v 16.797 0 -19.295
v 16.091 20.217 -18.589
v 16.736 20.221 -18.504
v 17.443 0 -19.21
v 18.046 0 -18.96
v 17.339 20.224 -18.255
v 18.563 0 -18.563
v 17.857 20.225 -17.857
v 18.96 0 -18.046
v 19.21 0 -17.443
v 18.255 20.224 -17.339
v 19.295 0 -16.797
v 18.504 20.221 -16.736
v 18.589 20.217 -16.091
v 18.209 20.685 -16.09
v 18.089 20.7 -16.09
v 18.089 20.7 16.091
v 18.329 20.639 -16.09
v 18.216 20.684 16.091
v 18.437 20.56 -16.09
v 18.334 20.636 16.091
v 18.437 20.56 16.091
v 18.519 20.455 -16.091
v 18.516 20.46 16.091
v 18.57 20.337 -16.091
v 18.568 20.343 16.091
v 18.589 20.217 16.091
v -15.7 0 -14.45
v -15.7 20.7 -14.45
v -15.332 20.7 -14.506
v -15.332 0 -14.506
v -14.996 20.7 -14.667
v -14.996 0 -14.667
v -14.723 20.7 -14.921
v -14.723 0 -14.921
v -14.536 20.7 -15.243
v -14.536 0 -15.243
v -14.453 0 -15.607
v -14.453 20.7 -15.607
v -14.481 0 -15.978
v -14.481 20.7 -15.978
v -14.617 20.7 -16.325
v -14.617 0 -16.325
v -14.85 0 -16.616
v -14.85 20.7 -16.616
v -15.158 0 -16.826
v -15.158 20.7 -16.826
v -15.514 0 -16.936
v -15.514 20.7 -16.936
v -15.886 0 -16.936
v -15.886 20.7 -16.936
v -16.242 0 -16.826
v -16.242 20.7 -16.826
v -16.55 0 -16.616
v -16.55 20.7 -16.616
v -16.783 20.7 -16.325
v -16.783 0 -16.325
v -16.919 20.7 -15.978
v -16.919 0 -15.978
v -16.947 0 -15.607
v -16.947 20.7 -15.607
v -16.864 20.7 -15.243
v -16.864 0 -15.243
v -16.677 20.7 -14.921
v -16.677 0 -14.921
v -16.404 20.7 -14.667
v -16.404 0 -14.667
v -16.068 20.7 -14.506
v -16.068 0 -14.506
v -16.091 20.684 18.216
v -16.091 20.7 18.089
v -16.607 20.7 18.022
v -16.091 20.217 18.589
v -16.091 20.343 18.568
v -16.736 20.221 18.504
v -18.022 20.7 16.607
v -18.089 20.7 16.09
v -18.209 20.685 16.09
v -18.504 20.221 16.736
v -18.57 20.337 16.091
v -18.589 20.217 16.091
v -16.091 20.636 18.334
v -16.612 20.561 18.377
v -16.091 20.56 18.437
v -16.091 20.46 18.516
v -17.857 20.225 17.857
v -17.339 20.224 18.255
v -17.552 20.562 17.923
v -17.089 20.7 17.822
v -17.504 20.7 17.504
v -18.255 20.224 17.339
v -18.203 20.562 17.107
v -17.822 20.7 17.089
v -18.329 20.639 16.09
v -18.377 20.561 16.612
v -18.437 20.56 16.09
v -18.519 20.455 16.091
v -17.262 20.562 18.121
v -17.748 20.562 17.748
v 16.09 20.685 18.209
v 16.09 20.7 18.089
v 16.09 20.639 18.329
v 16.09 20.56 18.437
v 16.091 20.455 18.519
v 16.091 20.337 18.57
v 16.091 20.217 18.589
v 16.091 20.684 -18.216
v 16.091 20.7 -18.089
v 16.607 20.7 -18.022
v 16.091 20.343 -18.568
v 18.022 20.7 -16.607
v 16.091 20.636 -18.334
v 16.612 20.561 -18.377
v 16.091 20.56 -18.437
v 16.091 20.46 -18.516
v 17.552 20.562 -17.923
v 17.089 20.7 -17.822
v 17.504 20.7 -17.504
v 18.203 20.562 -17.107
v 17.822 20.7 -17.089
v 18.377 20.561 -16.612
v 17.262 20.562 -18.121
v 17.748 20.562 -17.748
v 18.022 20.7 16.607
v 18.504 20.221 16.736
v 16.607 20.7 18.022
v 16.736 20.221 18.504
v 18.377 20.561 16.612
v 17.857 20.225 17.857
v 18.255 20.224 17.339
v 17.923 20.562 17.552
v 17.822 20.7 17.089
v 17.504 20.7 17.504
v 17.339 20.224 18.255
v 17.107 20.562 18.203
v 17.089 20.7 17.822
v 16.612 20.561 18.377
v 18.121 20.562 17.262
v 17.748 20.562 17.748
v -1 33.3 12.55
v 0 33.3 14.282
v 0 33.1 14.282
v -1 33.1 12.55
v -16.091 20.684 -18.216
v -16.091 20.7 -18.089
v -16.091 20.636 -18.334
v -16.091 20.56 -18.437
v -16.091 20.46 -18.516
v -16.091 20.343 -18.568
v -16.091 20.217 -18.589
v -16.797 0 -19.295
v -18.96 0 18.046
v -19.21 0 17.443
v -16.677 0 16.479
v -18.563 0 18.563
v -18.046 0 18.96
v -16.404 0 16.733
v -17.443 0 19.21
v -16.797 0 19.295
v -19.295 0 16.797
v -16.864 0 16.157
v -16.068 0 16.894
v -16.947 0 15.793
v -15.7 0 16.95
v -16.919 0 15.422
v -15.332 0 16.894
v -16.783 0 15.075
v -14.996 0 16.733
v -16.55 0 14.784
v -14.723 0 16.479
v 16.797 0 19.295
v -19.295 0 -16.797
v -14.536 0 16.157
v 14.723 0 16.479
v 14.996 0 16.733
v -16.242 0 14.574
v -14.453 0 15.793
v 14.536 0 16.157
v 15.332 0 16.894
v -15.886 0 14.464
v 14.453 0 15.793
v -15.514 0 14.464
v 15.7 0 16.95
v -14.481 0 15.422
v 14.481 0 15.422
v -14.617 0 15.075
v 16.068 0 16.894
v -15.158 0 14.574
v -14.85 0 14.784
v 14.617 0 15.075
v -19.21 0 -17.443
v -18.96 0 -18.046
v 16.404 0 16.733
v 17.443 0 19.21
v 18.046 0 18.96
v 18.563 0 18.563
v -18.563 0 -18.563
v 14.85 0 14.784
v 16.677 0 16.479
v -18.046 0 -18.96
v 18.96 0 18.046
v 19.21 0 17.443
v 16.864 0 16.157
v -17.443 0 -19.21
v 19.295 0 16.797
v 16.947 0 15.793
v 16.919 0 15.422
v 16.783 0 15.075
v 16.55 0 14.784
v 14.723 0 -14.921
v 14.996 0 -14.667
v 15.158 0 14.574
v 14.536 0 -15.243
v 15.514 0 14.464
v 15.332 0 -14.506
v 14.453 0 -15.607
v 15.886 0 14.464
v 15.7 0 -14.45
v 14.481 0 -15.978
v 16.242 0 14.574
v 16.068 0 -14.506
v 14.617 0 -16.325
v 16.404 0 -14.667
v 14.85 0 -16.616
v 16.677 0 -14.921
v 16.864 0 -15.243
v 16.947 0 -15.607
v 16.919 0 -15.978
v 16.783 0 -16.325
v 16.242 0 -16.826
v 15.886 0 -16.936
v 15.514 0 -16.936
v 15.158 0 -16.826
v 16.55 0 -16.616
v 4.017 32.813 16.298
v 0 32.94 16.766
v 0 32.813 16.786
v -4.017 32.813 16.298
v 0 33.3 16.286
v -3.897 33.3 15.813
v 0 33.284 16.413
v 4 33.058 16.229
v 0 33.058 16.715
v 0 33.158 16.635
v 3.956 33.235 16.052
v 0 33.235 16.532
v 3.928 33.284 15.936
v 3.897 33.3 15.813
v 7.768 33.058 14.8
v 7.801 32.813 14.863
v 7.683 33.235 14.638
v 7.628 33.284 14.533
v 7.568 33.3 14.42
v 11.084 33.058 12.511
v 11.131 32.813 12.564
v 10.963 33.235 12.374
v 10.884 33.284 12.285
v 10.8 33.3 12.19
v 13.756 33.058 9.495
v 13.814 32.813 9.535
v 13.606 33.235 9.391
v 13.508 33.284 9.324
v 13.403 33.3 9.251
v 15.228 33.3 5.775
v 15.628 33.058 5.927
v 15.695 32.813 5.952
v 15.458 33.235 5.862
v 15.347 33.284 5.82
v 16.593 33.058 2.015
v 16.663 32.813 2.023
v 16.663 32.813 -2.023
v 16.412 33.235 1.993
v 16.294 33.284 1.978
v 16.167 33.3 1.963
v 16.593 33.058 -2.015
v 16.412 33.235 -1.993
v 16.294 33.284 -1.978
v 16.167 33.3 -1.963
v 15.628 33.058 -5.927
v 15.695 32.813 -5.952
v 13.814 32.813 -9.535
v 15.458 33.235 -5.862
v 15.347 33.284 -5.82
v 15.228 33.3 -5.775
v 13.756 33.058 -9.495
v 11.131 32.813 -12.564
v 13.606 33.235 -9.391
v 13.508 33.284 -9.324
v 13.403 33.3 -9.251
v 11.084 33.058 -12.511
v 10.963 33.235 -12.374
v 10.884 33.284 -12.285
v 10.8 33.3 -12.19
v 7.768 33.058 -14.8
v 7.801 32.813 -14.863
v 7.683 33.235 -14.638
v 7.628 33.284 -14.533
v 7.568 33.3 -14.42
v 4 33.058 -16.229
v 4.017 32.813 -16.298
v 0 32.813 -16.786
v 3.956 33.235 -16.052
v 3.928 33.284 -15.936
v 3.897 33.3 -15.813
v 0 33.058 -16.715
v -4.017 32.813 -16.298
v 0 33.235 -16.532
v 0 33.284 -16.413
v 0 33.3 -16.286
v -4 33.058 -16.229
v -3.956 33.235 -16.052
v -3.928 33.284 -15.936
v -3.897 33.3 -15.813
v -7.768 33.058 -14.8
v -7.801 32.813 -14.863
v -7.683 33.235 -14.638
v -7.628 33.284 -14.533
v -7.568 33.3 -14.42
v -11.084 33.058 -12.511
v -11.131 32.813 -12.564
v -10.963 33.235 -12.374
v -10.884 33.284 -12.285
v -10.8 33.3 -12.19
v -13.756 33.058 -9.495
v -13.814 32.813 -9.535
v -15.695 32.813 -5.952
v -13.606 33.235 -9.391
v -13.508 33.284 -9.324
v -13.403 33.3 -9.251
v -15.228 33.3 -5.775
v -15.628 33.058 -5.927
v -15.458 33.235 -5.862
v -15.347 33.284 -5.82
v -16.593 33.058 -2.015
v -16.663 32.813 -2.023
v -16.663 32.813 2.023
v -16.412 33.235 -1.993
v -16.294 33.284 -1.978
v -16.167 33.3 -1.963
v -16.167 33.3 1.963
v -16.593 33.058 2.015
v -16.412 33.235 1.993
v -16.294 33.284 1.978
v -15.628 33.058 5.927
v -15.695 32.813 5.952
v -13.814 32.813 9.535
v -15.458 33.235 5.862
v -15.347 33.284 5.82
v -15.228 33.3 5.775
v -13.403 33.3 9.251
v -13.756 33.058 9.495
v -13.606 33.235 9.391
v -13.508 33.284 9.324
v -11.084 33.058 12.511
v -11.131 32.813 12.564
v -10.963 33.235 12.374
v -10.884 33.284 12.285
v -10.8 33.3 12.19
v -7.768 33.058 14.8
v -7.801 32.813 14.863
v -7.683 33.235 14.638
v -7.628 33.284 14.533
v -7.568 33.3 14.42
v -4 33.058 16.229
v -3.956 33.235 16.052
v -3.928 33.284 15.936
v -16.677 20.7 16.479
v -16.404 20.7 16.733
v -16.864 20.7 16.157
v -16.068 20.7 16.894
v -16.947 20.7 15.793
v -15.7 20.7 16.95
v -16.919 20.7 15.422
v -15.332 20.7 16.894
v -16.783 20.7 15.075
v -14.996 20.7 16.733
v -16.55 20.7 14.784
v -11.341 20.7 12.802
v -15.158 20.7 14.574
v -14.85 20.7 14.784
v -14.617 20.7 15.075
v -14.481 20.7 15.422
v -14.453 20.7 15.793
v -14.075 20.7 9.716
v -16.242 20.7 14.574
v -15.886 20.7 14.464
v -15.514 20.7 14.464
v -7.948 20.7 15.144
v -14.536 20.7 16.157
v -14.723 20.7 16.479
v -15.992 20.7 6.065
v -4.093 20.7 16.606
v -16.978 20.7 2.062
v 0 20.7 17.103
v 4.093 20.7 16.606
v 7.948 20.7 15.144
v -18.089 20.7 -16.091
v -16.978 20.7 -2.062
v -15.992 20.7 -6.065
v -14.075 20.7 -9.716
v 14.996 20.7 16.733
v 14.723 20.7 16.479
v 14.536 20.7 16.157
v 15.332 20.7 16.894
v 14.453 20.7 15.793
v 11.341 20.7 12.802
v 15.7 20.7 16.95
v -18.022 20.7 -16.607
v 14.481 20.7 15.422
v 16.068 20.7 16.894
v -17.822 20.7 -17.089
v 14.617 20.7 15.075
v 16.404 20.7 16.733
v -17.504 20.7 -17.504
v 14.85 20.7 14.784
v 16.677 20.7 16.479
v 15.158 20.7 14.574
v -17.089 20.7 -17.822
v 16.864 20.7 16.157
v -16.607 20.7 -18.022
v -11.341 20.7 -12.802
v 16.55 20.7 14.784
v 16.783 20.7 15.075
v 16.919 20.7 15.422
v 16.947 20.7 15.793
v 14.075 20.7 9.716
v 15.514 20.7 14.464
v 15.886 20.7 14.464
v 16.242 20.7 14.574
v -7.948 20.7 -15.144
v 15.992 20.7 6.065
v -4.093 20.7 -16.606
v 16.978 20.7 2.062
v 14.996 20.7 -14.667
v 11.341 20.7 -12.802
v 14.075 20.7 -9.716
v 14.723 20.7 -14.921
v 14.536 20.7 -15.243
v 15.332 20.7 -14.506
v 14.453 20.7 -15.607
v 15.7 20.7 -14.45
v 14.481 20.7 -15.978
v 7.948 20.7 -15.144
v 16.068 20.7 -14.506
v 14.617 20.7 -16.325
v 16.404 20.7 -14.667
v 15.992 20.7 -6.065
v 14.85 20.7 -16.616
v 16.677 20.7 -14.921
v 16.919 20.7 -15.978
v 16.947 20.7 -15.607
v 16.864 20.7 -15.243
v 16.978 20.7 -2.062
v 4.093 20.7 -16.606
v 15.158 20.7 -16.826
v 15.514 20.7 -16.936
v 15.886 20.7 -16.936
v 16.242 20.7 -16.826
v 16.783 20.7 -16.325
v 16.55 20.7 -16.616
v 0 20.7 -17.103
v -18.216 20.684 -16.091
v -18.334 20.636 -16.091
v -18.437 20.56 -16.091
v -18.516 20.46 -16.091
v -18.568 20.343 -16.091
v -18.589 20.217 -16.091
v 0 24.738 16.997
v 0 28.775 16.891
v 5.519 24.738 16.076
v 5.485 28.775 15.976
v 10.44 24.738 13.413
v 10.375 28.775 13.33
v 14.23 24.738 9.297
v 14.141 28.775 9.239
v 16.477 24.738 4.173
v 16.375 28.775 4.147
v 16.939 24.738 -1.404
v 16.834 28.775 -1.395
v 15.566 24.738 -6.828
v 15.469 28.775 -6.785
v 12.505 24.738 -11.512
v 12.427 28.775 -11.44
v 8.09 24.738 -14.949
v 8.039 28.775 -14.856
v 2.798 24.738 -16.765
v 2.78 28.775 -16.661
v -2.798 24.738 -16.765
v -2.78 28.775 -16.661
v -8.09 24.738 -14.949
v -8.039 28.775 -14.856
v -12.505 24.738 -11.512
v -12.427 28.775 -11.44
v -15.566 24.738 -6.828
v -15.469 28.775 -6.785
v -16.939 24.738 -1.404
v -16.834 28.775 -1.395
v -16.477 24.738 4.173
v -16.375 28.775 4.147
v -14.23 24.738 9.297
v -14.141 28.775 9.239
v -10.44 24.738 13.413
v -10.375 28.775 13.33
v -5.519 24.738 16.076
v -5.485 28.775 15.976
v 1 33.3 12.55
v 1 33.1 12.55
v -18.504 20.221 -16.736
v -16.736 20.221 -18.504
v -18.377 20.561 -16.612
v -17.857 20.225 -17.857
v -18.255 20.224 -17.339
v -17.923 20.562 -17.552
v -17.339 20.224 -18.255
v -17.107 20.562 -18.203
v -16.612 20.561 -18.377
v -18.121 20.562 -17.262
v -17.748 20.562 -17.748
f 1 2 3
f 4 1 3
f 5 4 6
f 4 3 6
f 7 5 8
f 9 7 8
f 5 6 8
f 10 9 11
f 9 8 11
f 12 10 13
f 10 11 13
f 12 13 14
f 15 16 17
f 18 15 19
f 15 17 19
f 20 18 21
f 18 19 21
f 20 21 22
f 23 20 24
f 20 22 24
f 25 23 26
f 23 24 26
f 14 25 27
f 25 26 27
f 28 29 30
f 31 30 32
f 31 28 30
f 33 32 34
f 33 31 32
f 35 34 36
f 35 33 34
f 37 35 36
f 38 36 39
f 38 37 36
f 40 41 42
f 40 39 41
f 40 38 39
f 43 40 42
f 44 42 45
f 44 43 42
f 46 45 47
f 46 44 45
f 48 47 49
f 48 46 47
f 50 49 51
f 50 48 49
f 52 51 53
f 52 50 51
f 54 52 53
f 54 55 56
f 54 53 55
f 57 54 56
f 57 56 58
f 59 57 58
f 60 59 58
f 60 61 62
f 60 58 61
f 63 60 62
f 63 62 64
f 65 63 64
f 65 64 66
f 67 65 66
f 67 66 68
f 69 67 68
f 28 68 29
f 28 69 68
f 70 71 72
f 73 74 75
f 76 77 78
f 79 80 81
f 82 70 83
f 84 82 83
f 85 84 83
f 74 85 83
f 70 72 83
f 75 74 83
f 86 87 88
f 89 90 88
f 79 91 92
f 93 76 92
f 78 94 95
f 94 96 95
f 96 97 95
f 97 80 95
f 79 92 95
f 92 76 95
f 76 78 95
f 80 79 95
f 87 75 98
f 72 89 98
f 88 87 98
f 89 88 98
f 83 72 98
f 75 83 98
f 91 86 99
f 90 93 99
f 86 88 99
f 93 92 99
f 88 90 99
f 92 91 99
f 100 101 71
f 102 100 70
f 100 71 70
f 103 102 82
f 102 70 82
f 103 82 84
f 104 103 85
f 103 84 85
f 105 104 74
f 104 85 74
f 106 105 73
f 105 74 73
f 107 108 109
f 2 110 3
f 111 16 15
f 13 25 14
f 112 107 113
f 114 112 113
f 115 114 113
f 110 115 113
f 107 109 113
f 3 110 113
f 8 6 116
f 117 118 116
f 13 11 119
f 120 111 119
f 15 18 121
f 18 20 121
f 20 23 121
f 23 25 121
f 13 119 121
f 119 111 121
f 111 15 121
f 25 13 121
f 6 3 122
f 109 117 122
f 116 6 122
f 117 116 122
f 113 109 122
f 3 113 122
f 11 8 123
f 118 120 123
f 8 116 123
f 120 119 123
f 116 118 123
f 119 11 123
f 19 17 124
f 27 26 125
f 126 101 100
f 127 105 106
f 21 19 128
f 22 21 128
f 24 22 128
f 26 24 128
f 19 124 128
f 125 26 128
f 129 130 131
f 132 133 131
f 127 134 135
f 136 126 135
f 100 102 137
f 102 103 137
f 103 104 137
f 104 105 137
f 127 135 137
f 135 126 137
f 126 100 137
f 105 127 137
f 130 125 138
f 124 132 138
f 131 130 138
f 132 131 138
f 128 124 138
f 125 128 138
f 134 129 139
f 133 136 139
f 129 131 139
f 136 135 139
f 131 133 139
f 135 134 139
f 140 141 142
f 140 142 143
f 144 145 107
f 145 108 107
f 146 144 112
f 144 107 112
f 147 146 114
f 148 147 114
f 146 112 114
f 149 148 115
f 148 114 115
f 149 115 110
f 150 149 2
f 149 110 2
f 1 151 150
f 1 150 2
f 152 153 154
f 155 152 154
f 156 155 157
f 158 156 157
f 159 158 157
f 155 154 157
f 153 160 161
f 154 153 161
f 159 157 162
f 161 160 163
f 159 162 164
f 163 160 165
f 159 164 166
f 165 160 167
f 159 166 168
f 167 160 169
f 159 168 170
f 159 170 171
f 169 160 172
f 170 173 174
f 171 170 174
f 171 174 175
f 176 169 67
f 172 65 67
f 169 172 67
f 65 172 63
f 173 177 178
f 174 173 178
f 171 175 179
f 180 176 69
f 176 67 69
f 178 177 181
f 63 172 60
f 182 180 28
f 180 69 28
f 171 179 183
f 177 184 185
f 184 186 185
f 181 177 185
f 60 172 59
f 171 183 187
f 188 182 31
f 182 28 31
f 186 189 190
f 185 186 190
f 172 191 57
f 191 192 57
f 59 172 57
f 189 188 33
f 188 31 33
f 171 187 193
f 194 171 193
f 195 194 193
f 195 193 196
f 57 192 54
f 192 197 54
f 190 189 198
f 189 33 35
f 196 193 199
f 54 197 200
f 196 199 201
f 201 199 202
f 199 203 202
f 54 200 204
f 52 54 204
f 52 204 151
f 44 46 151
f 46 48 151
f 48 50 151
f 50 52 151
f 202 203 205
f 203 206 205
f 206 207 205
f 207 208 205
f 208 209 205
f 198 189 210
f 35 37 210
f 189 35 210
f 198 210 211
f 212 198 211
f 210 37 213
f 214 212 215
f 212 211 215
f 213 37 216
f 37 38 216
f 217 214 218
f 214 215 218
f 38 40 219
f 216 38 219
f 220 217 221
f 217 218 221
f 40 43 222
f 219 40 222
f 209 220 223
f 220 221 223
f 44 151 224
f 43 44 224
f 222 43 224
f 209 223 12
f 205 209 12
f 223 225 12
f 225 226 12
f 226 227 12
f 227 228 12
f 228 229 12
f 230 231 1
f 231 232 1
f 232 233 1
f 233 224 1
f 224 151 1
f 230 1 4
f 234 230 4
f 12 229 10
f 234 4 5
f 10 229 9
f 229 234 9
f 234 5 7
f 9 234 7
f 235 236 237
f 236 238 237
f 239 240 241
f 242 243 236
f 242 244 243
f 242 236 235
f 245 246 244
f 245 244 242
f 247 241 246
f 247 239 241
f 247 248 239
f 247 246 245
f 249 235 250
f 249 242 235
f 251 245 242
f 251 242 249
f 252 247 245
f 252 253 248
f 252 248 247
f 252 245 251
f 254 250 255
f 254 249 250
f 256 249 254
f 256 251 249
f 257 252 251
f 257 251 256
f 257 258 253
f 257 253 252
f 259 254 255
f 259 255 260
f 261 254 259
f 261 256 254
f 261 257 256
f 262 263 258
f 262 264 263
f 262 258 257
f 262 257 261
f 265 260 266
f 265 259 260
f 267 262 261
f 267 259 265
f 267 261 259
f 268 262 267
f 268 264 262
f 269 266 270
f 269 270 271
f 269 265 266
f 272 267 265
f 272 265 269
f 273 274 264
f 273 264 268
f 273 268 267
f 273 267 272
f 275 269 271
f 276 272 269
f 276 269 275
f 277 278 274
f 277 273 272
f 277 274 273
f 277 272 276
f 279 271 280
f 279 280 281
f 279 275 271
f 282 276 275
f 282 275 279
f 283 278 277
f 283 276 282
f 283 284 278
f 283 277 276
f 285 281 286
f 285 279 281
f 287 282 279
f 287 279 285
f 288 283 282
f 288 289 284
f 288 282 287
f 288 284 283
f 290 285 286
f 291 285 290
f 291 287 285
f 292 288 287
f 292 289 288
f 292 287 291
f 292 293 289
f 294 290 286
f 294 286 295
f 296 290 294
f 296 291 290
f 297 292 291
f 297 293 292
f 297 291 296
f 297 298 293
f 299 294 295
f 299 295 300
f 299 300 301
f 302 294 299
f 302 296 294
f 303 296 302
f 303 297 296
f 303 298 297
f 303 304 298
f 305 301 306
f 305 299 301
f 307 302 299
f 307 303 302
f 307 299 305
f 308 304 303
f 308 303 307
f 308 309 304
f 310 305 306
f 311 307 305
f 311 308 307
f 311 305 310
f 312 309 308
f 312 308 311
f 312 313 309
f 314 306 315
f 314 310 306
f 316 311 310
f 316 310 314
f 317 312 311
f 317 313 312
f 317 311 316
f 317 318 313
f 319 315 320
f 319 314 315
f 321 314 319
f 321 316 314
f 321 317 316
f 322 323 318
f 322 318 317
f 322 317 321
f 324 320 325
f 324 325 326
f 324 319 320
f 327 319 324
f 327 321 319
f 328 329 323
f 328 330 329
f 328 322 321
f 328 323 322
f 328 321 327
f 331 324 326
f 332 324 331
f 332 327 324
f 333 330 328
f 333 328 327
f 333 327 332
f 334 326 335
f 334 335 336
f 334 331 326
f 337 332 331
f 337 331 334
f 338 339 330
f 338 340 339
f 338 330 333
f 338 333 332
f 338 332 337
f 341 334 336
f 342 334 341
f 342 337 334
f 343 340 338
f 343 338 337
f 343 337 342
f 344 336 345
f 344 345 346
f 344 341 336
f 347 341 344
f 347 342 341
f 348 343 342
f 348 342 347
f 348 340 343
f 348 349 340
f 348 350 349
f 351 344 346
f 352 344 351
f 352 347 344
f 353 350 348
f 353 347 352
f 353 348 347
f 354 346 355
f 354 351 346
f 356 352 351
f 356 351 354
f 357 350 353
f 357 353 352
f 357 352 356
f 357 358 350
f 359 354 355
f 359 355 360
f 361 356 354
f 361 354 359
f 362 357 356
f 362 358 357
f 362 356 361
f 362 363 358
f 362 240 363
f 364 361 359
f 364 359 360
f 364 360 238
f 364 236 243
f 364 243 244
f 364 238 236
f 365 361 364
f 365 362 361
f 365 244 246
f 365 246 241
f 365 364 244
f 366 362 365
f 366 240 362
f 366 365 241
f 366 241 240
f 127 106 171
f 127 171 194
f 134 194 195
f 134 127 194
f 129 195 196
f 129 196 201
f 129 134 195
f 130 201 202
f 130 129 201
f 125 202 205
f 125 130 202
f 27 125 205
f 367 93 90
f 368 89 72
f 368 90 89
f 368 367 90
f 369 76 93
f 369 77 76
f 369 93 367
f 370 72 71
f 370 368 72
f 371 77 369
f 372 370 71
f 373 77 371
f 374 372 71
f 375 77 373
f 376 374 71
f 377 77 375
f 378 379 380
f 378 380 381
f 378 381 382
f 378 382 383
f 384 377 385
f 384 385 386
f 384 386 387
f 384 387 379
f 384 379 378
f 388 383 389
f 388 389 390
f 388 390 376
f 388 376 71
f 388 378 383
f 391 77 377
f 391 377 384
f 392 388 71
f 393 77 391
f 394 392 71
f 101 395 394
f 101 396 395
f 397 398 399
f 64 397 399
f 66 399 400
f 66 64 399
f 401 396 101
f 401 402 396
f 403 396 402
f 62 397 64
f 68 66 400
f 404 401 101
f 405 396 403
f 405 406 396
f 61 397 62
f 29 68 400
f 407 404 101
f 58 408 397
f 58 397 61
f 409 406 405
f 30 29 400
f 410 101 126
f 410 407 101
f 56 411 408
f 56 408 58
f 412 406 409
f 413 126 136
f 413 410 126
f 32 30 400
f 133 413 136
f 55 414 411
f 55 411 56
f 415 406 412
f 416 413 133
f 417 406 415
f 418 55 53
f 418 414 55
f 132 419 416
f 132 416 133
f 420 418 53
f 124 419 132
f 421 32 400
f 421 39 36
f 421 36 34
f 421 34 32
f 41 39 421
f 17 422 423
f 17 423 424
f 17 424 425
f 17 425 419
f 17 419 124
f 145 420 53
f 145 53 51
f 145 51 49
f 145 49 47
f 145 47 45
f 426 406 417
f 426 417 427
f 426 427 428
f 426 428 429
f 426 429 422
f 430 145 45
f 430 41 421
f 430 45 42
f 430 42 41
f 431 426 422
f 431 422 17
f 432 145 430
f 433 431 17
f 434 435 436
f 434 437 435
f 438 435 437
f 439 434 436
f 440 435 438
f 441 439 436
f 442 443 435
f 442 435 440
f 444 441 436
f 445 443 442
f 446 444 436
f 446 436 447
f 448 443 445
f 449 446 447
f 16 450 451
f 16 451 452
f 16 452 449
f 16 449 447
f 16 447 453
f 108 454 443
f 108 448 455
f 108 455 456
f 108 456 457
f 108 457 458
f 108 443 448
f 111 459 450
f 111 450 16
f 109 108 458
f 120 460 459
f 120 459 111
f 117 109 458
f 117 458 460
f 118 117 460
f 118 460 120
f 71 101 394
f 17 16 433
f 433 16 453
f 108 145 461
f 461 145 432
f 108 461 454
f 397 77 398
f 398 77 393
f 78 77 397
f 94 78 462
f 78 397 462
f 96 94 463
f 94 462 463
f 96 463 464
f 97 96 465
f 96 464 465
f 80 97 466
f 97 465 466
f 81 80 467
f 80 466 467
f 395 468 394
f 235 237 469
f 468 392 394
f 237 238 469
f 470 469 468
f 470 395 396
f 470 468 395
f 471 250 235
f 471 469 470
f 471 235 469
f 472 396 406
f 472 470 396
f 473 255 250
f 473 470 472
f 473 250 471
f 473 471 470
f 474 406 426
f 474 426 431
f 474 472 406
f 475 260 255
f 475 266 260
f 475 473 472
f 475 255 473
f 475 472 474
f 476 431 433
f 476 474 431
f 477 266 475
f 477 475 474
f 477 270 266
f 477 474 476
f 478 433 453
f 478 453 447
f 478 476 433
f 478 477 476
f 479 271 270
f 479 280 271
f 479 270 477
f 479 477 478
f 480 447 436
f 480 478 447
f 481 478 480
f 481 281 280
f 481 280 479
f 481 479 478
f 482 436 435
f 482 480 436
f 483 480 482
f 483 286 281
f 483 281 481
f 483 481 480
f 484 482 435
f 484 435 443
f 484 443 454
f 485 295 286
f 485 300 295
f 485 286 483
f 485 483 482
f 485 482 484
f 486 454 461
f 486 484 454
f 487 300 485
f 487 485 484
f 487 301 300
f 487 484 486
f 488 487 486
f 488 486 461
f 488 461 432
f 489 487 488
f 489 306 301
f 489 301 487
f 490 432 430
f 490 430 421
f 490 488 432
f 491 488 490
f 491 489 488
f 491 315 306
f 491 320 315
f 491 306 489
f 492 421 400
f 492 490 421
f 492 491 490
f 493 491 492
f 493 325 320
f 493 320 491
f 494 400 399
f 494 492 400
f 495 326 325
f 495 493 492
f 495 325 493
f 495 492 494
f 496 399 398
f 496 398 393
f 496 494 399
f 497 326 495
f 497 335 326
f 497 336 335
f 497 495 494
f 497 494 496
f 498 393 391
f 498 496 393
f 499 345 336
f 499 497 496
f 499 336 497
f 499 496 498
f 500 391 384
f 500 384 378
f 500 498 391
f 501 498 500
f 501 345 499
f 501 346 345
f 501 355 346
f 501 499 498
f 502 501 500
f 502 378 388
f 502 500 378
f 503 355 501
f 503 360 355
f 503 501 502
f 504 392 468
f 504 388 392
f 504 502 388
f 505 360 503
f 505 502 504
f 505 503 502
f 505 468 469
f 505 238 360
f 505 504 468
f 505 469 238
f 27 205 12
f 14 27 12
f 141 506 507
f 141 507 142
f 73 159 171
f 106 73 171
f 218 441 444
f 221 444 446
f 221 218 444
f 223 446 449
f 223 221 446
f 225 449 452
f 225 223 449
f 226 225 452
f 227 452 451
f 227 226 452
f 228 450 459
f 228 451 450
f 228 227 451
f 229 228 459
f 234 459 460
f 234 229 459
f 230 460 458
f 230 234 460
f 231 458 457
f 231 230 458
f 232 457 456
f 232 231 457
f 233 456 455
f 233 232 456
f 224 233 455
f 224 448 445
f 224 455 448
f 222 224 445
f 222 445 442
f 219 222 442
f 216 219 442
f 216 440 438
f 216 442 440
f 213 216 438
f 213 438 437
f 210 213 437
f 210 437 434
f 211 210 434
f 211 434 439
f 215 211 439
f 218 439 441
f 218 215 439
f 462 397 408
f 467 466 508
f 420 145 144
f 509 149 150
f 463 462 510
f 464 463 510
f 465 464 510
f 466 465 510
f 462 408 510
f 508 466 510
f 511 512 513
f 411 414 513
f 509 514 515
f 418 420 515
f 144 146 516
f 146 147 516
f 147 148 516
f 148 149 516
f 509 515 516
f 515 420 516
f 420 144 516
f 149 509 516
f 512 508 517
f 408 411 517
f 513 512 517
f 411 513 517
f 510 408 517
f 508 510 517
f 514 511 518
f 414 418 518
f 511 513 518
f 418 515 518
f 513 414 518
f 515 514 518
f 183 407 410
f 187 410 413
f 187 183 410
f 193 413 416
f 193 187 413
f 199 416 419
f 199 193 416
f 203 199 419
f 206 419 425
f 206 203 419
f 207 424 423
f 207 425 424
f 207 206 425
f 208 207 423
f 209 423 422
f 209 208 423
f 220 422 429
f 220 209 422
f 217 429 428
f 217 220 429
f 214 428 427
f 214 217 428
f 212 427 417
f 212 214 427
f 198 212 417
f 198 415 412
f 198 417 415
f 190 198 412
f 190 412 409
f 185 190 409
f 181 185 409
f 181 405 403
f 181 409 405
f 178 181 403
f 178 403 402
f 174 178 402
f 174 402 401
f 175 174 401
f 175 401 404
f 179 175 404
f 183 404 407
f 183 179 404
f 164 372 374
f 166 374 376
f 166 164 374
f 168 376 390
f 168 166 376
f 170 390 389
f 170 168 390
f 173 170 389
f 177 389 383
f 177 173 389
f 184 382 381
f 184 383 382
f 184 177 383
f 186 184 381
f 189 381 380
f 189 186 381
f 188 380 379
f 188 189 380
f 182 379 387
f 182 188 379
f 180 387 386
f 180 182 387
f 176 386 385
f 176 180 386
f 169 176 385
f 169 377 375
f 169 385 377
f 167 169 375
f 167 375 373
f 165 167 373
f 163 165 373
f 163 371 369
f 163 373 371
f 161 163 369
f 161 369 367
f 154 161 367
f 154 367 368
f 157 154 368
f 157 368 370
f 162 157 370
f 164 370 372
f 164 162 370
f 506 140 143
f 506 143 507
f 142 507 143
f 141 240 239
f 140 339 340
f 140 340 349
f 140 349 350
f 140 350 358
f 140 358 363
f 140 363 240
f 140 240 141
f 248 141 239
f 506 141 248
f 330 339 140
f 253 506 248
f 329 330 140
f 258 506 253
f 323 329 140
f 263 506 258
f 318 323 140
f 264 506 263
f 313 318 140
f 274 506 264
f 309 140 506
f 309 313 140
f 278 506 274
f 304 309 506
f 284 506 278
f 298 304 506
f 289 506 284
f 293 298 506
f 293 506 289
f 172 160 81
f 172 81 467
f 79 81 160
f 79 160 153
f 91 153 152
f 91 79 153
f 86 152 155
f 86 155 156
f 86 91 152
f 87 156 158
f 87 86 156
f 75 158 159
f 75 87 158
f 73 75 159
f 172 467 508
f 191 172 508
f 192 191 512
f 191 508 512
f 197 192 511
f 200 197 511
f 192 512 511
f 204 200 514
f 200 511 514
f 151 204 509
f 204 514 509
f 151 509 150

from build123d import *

# Parameters (mm, degrees)
SZKIC1_W                    = 38.59
SZKIC1_H                    = 38.59
SZKIC1_R                    = 1.25
DODANIE_WYCI_GNI_CIE1_DEPTH = 33.3
SZKIC3_OUTSIDE_W            = 53.376
SZKIC3_OUTSIDE_H            = 53.376
SZKIC3_OUTSIDE_R            = 17.645
WYTNIJ_WYCI_GNI_CIE1_DEPTH  = 12.6
POCHYLENIE2_ANGLE           = -2
POCHYLENIE3_ANGLE           = -1.5
ZAOKR_GLENIE2_R             = 2.5
ZAOKR_GLENIE3_R             = 0.5
ZAOKR_GLENIE4_R             = 0.5
WYTNIJ_WYCI_GNI_CIE2_DEPTH  = 0.2


with BuildPart() as part:
    # Szkic1 → Dodanie-wyciągnięcie1 (new body)
    with BuildSketch(Plane(origin=(0, 0, 0), x_dir=(1, 0, 0), z_dir=(0, 1, 0))):
        Rectangle(SZKIC1_W, SZKIC1_H)
        with Locations(Location((-15.7, 15.7, 0), (0, 0, 270))):
            Circle(SZKIC1_R, mode=Mode.SUBTRACT)
        with Locations(Location((15.7, 15.7, 0), (0, 0, 270))):
            Circle(SZKIC1_R, mode=Mode.SUBTRACT)
        with Locations(Location((15.7, -15.7, 0), (0, 0, 270))):
            Circle(SZKIC1_R, mode=Mode.SUBTRACT)
        with Locations(Location((-15.7, -15.7, 0), (0, 0, 270))):
            Circle(SZKIC1_R, mode=Mode.SUBTRACT)
    extrude(amount=DODANIE_WYCI_GNI_CIE1_DEPTH)

    # Szkic3 outside → Wytnij-wyciągnięcie1 (cut)
    with BuildSketch(Plane(origin=(0, 33.3, 0), x_dir=(1, 0, 0), z_dir=(0, 1, 0))):
        Rectangle(SZKIC3_OUTSIDE_W, SZKIC3_OUTSIDE_H)
        with Locations(Location((0, 0, 0), (0, 0, 270))):
            Circle(SZKIC3_OUTSIDE_R, mode=Mode.SUBTRACT)
    extrude(amount=-WYTNIJ_WYCI_GNI_CIE1_DEPTH, mode=Mode.SUBTRACT)

    # Pochylenie2
    pochylenie2_faces = [part.faces().sort_by_distance(p)[0] for p in [
        (19.295, 10.35, 0),
        (0, 10.35, 19.295),
        (-19.295, 10.35, 0),
        (0, 10.35, -19.295),
    ]]
    draft(pochylenie2_faces, Plane(origin=(0, 0, 0), x_dir=(0, 0, -1), z_dir=(0, -1, 0)), POCHYLENIE2_ANGLE)

    # Pochylenie3
    pochylenie3_faces = [part.faces().sort_by_distance(p)[0] for p in [
        (0, 27, -17.645),
    ]]
    draft(pochylenie3_faces, Plane(origin=(0, 0, 0), x_dir=(0, 0, -1), z_dir=(0, -1, 0)), POCHYLENIE3_ANGLE)

    # Zaokrąglenie2
    zaokr_glenie2_edges = [part.edges().sort_by_distance(p)[0] for p in [
        (18.933570036, 10.35, 18.933570036),
        (-18.933570036, 10.35, 18.933570036),
        (-18.933570036, 10.35, -18.933570036),
        (18.933570036, 10.35, -18.933570036),
    ]]
    fillet(zaokr_glenie2_edges, radius=ZAOKR_GLENIE2_R)

    # Zaokrąglenie3
    zaokr_glenie3_edges = [part.edges().sort_by_distance(p)[0] for p in [
        (0, 20.7, -18.572140072),
        (18.572140072, 20.7, 0),
        (-18.572140072, 20.7, 0),
        (0, 20.7, 18.572140072),
        (17.840537572, 20.7, 17.840537572),
        (-17.840537572, 20.7, 17.840537572),
        (-17.840537572, 20.7, -17.840537572),
        (17.840537572, 20.7, -17.840537572),
    ]]
    fillet(zaokr_glenie3_edges, radius=ZAOKR_GLENIE3_R)

    # Zaokrąglenie4
    zaokr_glenie4_edges = [part.edges().sort_by_distance(p)[0] for p in [
        (0, 33.3, -16.773008812),
    ]]
    fillet(zaokr_glenie4_edges, radius=ZAOKR_GLENIE4_R)

    # Szkic4 → Wytnij-wyciągnięcie2 (cut)
    with BuildSketch(Plane(origin=(0, 33.3, 0), x_dir=(1, 0, 0), z_dir=(0, 1, 0))):
        Polygon((-1, -12.549966068), (1, -12.549966068), (0, -14.282016876), align=None)
    extrude(amount=-WYTNIJ_WYCI_GNI_CIE2_DEPTH, mode=Mode.SUBTRACT)


solid = part.part
